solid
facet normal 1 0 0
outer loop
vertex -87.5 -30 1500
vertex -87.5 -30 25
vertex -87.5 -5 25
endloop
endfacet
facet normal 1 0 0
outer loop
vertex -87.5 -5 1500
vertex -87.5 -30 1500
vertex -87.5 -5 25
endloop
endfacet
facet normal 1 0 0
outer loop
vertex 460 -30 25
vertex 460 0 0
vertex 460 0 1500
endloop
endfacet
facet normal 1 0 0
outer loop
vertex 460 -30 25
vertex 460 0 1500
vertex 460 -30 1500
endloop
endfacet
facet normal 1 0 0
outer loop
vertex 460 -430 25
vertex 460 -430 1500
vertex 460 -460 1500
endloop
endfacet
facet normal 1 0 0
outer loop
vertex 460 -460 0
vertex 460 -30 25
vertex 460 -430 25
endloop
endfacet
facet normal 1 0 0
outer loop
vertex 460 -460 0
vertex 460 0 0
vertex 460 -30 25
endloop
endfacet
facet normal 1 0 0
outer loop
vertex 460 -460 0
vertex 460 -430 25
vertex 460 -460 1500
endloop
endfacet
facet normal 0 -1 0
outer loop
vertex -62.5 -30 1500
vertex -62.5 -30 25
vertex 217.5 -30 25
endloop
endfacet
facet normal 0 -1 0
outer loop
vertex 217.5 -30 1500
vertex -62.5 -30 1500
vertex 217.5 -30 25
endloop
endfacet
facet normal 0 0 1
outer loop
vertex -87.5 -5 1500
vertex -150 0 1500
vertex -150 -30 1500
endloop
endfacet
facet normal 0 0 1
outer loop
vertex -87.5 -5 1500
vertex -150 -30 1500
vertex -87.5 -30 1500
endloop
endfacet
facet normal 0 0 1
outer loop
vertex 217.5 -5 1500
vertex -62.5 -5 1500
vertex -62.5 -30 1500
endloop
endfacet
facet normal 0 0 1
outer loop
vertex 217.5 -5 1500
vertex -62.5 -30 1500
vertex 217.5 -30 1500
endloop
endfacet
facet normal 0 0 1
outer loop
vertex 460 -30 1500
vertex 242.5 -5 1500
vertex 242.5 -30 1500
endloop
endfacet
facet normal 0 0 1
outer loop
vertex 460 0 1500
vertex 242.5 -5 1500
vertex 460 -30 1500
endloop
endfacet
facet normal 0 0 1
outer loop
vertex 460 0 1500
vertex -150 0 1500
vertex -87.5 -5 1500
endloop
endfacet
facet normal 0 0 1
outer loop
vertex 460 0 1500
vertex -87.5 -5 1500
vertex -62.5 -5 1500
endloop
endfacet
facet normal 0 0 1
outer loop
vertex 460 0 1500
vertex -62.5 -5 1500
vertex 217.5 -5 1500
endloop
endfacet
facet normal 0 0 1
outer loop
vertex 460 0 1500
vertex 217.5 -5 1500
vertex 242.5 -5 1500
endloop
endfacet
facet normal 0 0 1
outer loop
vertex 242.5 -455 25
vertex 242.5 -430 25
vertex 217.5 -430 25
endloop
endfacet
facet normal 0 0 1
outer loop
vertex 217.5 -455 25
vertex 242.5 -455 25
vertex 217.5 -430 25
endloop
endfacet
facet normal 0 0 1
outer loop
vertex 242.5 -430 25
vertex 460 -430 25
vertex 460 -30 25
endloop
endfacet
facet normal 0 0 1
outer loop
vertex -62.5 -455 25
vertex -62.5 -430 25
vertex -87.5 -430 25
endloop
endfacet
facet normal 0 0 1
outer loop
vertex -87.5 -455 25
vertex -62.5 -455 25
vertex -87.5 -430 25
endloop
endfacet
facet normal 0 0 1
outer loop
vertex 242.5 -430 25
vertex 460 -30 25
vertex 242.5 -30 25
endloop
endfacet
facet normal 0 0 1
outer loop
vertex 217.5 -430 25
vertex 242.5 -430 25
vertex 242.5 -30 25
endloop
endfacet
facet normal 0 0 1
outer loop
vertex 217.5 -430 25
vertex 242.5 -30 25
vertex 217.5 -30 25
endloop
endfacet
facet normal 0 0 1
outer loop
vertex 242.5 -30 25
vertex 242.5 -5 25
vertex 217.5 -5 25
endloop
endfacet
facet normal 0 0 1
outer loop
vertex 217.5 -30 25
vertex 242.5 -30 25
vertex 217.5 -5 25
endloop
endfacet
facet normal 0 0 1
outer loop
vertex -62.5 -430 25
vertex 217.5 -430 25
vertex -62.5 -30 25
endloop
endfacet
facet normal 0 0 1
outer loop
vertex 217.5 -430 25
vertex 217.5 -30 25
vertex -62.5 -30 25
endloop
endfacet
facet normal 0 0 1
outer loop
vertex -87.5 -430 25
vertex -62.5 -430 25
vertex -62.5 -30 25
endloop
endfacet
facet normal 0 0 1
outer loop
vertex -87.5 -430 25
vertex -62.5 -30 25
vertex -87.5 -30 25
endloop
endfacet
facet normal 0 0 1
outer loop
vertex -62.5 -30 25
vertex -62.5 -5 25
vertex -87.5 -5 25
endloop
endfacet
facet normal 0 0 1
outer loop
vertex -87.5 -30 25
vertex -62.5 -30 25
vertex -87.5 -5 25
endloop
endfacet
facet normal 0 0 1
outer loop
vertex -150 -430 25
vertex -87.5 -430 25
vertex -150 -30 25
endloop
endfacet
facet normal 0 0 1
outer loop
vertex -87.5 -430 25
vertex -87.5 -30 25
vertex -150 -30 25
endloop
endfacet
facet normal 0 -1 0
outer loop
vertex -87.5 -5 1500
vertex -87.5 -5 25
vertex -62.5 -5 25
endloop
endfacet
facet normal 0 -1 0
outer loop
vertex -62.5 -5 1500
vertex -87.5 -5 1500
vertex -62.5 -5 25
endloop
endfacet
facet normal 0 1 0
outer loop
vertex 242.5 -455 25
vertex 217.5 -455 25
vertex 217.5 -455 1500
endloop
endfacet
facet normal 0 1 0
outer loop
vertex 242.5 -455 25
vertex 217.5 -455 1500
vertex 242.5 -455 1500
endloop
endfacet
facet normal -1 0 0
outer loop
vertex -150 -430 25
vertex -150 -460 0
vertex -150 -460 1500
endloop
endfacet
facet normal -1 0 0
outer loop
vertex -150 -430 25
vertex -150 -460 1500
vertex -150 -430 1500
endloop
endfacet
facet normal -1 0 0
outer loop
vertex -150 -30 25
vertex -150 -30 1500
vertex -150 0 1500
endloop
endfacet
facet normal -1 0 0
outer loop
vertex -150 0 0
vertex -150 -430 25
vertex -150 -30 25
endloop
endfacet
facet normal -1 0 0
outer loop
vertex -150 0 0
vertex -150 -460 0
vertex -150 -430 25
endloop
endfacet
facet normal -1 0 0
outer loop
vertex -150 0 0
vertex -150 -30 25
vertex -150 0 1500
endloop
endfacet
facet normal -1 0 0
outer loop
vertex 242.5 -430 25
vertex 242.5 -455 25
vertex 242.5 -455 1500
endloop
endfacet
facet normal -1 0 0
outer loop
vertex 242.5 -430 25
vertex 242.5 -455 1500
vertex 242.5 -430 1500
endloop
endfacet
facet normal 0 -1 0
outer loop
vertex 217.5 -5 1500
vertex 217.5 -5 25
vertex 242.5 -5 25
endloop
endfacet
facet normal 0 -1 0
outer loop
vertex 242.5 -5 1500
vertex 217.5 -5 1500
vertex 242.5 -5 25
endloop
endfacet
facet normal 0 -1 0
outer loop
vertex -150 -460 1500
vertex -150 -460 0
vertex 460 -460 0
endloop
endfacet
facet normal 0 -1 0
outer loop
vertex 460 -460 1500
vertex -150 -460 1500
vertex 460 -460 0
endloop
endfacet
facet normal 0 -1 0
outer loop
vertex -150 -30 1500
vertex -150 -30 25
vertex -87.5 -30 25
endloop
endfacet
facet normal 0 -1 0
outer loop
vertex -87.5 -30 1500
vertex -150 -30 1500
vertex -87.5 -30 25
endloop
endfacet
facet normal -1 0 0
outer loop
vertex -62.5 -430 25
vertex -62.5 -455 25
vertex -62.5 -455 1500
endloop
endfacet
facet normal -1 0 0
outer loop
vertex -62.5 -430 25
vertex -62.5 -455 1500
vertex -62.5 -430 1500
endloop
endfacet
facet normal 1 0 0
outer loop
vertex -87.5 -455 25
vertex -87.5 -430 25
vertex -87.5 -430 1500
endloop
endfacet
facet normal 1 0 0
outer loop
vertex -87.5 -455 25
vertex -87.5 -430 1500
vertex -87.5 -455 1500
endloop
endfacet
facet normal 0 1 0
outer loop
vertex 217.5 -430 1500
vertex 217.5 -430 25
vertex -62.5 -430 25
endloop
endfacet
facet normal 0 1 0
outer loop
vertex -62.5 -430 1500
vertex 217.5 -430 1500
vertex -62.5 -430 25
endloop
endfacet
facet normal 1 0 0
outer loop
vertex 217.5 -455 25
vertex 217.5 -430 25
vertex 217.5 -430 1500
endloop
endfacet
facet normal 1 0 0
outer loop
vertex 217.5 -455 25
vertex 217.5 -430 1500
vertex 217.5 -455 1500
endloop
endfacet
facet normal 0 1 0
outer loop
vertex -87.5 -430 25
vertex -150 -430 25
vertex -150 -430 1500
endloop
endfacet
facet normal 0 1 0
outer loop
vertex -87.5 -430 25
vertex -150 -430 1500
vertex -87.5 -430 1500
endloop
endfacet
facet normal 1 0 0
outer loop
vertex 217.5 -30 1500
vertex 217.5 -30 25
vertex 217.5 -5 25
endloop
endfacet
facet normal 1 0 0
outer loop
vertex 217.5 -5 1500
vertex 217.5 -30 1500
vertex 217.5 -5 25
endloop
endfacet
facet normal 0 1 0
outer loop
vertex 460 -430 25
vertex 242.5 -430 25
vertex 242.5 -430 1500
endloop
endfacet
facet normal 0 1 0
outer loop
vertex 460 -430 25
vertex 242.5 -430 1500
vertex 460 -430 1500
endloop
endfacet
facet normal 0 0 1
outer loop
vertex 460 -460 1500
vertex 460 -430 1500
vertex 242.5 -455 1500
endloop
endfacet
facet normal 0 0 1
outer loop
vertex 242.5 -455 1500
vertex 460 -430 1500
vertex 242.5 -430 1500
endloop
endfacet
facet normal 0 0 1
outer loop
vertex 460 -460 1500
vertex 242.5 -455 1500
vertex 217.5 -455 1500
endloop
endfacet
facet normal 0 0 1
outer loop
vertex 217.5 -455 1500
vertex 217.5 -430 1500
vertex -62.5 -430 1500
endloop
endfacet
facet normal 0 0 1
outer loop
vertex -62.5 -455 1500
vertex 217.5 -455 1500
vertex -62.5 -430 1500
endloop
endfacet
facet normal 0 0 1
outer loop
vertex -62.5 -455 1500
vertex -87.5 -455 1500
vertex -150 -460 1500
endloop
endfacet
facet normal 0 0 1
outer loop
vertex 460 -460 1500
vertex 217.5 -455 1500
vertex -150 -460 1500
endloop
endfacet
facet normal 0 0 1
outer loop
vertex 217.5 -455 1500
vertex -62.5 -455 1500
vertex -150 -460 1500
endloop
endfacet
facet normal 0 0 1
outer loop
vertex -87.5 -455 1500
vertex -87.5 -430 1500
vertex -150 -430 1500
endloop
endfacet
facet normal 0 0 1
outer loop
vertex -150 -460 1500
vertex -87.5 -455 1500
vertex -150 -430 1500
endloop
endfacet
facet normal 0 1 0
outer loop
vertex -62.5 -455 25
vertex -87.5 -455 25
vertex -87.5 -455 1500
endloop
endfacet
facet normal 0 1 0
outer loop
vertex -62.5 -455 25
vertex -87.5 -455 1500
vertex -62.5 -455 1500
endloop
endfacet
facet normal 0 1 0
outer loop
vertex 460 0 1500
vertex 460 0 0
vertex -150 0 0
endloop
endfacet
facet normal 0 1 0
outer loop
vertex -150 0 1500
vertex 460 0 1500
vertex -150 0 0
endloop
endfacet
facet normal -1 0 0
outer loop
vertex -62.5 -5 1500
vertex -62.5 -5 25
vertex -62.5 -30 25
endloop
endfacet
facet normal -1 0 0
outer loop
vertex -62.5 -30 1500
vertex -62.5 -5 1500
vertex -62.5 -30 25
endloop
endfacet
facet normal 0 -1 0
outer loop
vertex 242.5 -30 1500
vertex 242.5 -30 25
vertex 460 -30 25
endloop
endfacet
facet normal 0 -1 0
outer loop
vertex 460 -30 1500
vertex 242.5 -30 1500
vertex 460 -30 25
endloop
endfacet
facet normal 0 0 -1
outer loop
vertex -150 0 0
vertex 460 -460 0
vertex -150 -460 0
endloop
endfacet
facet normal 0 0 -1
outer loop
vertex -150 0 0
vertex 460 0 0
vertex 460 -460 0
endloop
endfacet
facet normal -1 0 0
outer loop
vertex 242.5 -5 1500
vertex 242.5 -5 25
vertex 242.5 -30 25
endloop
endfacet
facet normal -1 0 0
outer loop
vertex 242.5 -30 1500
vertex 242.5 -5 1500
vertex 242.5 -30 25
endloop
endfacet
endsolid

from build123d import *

# Parameters (mm, degrees)
BOSS_EXTRUDE1_DEPTH   = 1500
BOSS_EXTRUDE1_2_DEPTH = 1500
SKETCH5_W             = 610
SKETCH5_H             = 460
BOSS_EXTRUDE5_DEPTH   = 25


with BuildPart() as part:
    # Sketch1 → Boss-Extrude1 (new body)
    with BuildSketch(Plane.XY):
        Polygon((0, -30), (217.5, -30), (217.5, -5), (242.5, -5), (242.5, -30), (460, -30), (460, 0), (0, 0), (-150, 0), (-150, -30), (-87.5, -30), (-87.5, -5), (-62.5, -5), (-62.5, -30), align=None)
    extrude(amount=BOSS_EXTRUDE1_DEPTH)



with BuildPart() as body_2:
    # Sketch1 → Boss-Extrude1 2 (new body)
    with BuildSketch(Plane.XY):
        Polygon((-62.5, -430), (0, -430), (217.5, -430), (217.5, -455), (242.5, -455), (242.5, -430), (460, -430), (460, -460), (0, -460), (-150, -460), (-150, -430), (-87.5, -430), (-87.5, -455), (-62.5, -455), align=None)
    extrude(amount=BOSS_EXTRUDE1_2_DEPTH)


with BuildPart() as part_1:
    add(part.part)

    add(body_2.part)  # Boss-Extrude5 merges body 2
    # Sketch5 → Boss-Extrude5 (add)
    with BuildSketch(Plane(origin=(0, 0, 0), x_dir=(-1, 0, 0), z_dir=(0, 0, -1))):
        with Locations((-155, -230)):
            Rectangle(SKETCH5_W, SKETCH5_H)
    extrude(amount=-BOSS_EXTRUDE5_DEPTH)


solid = part_1.part
